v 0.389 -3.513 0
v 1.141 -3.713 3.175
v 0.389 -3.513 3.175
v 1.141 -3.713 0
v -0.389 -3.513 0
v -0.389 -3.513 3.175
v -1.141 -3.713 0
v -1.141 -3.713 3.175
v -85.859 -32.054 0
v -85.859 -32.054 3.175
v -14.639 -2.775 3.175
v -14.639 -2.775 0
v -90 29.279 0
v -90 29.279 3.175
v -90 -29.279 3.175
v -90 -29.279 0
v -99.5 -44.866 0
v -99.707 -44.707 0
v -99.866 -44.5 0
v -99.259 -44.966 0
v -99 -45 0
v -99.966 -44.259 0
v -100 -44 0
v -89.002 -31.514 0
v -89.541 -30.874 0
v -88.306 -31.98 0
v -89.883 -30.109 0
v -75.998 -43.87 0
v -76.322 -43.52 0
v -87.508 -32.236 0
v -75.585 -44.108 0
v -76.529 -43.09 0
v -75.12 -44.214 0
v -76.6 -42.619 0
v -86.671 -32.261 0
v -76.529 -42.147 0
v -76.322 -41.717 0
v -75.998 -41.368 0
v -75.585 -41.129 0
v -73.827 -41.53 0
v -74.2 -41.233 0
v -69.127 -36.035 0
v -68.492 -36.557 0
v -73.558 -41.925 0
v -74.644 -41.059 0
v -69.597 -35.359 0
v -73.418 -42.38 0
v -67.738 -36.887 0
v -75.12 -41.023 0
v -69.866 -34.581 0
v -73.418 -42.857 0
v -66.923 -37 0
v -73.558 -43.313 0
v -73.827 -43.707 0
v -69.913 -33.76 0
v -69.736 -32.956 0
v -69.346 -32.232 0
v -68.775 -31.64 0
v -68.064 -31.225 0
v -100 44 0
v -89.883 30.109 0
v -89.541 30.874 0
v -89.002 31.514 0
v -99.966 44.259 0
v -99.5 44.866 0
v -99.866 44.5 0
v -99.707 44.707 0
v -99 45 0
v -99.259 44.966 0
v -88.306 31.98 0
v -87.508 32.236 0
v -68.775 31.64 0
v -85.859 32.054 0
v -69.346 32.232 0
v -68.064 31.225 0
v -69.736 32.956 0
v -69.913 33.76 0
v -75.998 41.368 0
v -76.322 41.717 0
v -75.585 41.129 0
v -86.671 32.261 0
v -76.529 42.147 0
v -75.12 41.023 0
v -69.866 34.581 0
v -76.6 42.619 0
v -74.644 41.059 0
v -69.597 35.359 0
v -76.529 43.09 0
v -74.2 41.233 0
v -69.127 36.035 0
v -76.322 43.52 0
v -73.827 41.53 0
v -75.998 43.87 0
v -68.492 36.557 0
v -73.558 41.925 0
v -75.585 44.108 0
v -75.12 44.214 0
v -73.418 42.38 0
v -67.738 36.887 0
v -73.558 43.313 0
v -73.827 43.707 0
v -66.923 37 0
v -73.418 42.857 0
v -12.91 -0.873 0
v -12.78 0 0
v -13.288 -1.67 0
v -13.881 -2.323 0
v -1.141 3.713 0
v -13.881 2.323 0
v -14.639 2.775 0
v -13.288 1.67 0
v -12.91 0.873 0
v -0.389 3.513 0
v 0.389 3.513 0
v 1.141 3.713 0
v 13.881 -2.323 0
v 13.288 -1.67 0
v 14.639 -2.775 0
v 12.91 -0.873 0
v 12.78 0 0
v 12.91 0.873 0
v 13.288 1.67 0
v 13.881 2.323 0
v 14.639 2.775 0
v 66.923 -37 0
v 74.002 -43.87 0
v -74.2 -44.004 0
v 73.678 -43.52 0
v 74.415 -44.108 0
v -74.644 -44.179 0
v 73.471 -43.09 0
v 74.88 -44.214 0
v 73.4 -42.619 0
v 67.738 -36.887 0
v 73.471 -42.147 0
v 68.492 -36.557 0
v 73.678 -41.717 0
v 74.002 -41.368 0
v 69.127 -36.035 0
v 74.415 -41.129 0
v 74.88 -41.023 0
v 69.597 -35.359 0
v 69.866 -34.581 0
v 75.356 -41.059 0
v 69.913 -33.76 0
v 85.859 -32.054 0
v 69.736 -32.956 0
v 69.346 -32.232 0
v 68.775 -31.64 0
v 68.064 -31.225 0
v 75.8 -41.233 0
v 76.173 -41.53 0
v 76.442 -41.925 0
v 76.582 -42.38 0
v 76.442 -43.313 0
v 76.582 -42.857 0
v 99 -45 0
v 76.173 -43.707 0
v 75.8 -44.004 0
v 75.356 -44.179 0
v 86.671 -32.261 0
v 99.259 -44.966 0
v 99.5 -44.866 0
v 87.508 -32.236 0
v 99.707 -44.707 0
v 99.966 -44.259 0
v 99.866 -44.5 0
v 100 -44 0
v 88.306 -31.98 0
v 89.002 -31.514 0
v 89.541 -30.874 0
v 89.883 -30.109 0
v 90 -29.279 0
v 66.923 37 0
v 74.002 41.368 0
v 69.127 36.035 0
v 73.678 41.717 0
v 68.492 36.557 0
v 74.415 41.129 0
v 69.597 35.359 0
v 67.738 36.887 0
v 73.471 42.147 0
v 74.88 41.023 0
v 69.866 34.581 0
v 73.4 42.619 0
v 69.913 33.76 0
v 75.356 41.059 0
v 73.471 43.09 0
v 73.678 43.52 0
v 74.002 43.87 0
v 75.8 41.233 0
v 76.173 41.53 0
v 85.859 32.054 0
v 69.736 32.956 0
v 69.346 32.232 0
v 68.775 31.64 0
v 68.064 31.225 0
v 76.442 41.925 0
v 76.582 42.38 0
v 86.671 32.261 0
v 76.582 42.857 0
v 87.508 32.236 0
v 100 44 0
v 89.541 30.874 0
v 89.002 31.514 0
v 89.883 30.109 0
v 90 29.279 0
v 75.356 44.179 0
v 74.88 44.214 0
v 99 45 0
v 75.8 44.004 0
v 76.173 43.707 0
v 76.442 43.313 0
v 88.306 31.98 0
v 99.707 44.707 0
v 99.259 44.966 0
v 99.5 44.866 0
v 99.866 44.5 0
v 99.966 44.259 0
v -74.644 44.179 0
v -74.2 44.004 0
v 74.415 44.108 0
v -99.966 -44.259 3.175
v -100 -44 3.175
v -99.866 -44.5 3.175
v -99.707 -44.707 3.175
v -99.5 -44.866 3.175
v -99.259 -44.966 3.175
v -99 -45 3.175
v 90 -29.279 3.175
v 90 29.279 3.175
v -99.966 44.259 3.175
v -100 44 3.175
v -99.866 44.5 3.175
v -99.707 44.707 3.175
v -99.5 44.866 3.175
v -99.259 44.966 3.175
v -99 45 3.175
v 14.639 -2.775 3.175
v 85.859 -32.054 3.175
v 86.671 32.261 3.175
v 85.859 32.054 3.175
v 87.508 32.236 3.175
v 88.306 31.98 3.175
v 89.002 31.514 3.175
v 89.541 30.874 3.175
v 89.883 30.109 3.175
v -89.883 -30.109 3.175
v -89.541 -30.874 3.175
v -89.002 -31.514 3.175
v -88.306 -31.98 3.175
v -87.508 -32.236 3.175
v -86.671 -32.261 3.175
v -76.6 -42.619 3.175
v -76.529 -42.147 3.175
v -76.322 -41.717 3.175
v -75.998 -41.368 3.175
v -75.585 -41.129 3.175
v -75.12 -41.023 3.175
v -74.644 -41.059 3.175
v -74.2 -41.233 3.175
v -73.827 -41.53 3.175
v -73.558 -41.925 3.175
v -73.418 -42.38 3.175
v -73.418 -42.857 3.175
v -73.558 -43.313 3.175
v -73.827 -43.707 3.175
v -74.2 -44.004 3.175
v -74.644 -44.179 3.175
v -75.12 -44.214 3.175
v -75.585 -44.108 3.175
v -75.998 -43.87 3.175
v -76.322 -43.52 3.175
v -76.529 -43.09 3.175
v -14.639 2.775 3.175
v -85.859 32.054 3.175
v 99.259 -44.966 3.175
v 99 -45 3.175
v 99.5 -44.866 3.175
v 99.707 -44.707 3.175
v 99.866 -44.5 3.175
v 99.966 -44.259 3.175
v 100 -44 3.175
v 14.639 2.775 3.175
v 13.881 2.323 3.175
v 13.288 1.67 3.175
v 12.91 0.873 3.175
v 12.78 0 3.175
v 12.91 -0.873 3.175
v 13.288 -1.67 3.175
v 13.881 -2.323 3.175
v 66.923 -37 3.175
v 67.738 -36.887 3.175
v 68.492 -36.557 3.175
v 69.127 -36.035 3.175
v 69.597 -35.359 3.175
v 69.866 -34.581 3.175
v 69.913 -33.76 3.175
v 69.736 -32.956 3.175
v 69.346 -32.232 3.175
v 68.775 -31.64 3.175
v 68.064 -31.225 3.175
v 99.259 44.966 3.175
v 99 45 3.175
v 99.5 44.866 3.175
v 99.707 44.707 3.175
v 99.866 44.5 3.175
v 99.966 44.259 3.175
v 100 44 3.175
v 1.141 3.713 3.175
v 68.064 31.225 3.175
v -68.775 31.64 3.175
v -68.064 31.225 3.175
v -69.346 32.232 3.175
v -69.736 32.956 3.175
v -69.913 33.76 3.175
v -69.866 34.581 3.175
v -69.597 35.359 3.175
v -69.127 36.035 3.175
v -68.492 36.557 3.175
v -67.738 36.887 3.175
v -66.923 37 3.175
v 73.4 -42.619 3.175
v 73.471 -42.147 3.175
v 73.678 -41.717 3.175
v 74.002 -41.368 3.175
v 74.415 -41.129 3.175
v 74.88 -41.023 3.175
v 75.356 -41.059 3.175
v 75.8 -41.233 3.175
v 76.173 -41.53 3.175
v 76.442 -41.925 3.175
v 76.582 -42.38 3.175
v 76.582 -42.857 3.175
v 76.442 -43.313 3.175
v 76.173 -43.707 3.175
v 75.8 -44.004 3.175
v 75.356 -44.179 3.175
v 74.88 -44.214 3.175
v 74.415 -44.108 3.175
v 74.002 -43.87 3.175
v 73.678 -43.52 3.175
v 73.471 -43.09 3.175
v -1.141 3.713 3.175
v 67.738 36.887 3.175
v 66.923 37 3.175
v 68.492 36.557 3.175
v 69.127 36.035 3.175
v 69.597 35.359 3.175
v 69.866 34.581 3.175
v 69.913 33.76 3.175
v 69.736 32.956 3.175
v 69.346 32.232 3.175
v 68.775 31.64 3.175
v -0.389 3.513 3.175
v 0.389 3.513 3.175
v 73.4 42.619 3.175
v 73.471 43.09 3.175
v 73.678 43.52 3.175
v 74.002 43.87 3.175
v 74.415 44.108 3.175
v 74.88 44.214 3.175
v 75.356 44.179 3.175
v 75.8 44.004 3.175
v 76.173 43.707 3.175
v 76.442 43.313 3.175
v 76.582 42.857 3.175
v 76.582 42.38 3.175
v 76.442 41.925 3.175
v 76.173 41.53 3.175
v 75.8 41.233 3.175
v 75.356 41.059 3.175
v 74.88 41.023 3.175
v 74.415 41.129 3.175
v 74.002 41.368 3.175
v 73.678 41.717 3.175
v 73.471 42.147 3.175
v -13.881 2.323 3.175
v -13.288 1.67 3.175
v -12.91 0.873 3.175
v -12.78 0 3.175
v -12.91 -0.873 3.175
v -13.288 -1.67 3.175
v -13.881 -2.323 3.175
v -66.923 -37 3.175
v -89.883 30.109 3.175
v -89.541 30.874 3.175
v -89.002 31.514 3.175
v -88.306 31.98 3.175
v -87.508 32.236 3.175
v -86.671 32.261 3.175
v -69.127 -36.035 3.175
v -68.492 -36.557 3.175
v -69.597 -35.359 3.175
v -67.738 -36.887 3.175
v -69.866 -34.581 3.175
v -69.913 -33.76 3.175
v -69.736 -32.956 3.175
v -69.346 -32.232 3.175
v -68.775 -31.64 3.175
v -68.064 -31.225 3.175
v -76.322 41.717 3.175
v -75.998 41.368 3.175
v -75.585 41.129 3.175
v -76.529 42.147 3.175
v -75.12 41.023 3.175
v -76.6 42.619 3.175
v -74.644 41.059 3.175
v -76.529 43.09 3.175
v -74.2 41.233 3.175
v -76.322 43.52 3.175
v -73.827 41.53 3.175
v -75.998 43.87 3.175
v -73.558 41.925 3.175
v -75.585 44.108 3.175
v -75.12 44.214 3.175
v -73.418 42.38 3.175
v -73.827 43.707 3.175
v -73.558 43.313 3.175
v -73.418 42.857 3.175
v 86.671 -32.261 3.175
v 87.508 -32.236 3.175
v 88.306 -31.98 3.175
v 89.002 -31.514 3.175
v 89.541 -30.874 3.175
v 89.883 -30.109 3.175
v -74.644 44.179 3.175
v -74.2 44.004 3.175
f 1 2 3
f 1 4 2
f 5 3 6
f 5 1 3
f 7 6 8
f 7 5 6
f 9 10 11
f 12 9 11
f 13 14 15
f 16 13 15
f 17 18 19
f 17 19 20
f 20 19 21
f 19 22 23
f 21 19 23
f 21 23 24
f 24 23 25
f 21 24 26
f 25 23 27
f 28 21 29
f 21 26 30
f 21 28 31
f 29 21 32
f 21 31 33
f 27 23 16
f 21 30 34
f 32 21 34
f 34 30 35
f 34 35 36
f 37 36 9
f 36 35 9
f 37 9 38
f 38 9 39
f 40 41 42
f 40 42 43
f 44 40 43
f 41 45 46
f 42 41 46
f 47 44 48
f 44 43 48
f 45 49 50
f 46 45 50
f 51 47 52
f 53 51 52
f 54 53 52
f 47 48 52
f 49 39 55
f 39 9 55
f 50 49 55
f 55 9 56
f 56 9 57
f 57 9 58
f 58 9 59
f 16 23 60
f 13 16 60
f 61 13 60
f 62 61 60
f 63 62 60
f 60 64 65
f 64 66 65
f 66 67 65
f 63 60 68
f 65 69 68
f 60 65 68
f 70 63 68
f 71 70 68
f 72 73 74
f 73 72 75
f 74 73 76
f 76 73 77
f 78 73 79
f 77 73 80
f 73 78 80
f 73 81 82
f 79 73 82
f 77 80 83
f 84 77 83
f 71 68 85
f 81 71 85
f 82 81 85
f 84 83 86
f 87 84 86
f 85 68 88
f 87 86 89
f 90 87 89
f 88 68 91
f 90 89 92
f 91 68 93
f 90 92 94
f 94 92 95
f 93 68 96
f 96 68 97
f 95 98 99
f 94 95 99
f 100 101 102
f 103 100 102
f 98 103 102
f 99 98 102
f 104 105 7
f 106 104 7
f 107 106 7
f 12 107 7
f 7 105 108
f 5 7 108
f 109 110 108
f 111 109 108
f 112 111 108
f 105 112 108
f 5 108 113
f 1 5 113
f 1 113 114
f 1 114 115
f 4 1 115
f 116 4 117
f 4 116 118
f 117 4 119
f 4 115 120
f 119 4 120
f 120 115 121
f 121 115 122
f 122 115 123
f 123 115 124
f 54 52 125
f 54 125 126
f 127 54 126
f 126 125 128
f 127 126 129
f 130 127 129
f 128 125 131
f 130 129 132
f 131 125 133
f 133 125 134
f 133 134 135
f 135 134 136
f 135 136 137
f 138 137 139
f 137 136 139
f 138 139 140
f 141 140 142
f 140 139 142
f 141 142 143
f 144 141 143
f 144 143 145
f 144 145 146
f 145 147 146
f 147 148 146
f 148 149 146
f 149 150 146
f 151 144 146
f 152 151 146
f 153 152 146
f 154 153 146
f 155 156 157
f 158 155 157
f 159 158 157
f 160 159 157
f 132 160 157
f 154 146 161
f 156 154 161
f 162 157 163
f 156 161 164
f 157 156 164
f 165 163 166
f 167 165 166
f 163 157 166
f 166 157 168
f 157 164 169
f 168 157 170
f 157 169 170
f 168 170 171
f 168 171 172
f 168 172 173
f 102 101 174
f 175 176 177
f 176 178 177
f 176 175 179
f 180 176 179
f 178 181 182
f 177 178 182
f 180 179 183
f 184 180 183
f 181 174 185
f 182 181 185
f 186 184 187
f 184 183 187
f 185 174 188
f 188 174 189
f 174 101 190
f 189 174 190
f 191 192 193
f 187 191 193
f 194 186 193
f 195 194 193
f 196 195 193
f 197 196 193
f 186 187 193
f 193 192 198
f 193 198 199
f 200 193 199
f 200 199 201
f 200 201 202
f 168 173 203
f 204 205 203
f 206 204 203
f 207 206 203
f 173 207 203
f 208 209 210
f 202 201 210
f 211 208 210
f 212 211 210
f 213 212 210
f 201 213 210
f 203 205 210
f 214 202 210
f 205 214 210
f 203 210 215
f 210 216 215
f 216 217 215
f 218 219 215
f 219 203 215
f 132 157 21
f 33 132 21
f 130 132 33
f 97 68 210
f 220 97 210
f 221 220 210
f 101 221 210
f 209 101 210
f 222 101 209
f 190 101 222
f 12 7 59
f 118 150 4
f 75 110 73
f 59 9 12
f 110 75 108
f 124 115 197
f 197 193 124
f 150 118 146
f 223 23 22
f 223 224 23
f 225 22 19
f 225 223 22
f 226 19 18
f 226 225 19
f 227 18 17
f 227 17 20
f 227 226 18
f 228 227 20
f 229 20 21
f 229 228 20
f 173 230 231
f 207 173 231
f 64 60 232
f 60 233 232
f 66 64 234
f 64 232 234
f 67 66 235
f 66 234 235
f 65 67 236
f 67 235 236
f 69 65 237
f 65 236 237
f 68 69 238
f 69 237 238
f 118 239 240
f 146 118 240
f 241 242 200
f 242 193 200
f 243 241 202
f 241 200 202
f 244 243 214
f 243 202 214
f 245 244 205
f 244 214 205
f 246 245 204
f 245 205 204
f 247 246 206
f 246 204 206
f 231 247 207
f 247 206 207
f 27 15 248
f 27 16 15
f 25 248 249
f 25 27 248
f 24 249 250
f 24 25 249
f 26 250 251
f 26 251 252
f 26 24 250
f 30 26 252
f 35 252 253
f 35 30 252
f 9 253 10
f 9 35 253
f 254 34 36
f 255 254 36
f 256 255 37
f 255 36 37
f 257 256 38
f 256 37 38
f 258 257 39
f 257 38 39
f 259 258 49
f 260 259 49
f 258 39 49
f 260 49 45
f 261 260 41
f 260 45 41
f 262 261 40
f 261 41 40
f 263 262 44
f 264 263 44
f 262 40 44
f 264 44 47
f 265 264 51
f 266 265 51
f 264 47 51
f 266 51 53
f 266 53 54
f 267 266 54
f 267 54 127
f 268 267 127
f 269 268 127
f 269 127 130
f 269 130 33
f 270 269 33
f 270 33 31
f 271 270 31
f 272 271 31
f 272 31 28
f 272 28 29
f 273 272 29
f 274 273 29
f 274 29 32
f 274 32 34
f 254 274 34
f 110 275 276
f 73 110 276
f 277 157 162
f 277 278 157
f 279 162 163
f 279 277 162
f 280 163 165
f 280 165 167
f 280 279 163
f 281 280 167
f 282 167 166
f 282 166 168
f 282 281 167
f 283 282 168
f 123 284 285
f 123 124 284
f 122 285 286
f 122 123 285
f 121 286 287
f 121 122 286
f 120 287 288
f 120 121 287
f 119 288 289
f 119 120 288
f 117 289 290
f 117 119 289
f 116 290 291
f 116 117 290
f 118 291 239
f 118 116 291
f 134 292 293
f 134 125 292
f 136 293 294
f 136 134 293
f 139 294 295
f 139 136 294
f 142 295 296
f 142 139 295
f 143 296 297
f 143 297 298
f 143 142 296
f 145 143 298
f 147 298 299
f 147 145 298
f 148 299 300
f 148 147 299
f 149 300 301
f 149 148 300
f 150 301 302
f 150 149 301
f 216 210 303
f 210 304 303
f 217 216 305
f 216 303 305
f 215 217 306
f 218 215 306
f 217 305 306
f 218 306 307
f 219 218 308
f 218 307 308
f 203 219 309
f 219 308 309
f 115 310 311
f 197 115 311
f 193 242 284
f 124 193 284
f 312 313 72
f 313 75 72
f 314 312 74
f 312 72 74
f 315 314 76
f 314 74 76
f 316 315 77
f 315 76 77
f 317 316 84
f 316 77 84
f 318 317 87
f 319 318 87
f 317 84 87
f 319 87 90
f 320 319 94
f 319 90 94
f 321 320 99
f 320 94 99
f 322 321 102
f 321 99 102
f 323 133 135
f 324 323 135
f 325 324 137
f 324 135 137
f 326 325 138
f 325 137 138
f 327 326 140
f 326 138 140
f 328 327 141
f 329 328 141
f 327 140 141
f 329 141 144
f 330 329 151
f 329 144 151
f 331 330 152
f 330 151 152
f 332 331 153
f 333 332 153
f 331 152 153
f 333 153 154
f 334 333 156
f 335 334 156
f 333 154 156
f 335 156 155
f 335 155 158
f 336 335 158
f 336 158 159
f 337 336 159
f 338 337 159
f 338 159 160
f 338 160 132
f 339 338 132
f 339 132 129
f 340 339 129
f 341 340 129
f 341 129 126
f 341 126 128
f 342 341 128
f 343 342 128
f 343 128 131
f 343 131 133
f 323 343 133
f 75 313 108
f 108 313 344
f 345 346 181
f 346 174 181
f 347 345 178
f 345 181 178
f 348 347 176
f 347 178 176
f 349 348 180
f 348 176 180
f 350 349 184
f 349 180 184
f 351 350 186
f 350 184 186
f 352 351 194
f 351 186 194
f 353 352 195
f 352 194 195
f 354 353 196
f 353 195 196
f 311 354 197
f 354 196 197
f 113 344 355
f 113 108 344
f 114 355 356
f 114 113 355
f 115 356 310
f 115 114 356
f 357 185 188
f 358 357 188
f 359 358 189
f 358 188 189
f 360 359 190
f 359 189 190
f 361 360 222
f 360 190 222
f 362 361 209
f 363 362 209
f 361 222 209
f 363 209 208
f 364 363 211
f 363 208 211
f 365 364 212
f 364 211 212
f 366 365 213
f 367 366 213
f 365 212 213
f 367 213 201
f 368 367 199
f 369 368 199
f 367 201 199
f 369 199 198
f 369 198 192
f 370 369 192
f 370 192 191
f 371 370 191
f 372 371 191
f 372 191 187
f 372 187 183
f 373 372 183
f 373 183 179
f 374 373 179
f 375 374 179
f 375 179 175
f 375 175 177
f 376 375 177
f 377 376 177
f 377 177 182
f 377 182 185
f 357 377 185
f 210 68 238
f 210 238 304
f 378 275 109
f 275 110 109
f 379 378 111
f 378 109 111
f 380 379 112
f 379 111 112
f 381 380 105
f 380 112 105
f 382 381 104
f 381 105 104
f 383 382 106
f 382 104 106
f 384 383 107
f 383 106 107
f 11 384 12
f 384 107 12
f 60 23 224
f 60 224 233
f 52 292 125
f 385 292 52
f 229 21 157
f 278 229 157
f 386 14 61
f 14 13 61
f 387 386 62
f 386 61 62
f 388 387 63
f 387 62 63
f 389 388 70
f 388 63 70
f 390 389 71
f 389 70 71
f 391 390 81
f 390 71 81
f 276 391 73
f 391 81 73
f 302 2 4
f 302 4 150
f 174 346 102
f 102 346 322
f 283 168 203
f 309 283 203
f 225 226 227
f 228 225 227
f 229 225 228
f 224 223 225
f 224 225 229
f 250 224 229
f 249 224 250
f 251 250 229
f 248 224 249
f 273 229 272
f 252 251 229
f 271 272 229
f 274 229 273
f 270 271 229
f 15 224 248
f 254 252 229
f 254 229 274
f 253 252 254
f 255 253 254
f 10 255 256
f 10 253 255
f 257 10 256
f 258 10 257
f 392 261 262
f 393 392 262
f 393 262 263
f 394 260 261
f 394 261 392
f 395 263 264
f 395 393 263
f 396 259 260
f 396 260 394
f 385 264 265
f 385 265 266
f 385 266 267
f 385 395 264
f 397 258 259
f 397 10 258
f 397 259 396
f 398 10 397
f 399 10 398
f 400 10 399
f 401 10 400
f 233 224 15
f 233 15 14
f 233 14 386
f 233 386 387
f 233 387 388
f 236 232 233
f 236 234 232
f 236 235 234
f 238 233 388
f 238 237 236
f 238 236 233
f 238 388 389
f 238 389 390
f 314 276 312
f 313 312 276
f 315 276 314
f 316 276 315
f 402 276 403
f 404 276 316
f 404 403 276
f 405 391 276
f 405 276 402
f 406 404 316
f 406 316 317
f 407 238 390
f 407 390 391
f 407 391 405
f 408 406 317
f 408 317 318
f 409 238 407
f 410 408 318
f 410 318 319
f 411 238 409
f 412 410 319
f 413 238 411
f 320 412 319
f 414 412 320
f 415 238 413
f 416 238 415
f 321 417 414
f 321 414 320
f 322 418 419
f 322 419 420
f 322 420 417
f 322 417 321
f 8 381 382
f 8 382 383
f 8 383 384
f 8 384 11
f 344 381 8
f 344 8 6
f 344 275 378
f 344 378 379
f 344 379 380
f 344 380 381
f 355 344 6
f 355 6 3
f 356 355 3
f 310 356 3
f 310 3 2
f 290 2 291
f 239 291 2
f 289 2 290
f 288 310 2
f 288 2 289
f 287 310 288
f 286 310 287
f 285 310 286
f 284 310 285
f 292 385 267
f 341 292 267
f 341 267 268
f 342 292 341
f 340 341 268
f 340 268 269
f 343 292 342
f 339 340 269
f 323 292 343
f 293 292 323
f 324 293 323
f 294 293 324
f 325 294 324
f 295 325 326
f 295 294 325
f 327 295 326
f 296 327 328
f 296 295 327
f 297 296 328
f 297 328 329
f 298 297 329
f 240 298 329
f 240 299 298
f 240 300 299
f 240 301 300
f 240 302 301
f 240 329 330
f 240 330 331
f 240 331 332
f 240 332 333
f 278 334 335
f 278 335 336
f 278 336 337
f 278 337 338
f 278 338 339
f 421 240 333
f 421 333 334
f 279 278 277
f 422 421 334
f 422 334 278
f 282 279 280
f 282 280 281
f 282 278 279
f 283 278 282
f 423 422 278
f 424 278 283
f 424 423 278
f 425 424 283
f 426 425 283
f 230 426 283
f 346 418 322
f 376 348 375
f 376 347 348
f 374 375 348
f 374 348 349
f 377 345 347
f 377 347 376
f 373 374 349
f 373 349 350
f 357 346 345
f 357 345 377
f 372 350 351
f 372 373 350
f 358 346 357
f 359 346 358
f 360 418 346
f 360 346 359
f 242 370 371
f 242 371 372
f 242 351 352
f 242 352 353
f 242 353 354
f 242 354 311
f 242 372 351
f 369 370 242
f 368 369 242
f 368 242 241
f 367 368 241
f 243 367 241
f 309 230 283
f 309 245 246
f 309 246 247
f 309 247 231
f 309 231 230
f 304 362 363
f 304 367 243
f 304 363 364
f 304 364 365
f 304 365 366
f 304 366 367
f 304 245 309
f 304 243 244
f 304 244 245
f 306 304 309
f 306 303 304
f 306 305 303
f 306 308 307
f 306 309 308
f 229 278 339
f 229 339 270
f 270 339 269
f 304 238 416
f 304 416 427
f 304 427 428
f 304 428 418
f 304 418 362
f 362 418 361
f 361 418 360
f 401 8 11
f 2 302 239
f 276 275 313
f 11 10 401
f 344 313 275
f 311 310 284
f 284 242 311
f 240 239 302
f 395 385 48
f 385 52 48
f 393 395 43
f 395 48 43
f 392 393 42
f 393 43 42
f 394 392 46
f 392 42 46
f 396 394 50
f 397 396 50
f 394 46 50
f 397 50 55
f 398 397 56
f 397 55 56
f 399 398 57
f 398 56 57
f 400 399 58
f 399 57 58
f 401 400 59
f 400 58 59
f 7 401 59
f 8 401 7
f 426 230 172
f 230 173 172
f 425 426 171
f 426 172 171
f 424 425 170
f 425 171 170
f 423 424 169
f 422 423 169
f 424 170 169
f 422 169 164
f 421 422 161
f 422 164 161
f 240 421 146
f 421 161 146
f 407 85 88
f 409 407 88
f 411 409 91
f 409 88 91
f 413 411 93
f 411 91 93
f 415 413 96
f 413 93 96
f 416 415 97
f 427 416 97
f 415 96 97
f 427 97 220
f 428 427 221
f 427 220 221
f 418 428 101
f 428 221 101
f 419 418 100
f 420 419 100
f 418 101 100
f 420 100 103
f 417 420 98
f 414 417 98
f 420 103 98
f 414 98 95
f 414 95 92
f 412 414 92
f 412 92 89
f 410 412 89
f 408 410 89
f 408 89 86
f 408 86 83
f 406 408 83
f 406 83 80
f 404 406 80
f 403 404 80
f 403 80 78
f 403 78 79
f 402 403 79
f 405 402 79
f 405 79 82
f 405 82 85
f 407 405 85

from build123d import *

# Parameters (mm, degrees)
SKETCH1_W            = 200
SKETCH1_H            = 90
BOSS_EXTRUDE1_DEPTH  = 3.175
CUT_EXTRUDE1_DEPTH   = 110.704515062
M3_CLEARANCE_HOLE1_D = 3.2
FILLET1_R            = 3
FILLET2_R            = 1


with BuildPart() as part:
    # Sketch1 → Boss-Extrude1 (new body)
    with BuildSketch(Plane.XY):
        Rectangle(SKETCH1_W, SKETCH1_H)
    extrude(amount=BOSS_EXTRUDE1_DEPTH)

    # Sketch2 → Cut-Extrude1 (cut, through all)
    with BuildSketch(Plane.XY.offset(3.175)):
        Polygon((-90, 33.756373771), (-90, -33.756373771), (-7.889901637, 0), align=None)
        Polygon((-82.110098363, 37), (0, 3.243626229), (82.110098363, 37), align=None)
        Polygon((90, 33.756373771), (7.889901637, 0), (90, -33.756373771), align=None)
        Polygon((-82.110098363, -37), (0, -3.243626229), (82.110098363, -37), align=None)
    extrude(amount=-CUT_EXTRUDE1_DEPTH, mode=Mode.SUBTRACT)

    # M3 Clearance Hole1 (through all)
    with Locations(Plane.XY.offset(3.175)):
        with Locations((-75, 42.61875), (75, 42.61875), (75, -42.61875), (-75, -42.61875)):
            Hole(M3_CLEARANCE_HOLE1_D / 2)

    # Fillet1
    fillet1_edges = [part.edges().sort_by_distance(p)[0] for p in [
        (-82.110098363, 37, 1.5875),
        (82.110098363, 37, 1.5875),
        (0, 3.243626229, 1.5875),
        (82.110098363, -37, 1.5875),
        (-82.110098363, -37, 1.5875),
        (0, -3.243626229, 1.5875),
        (90, 33.756373771, 1.5875),
        (90, -33.756373771, 1.5875),
        (7.889901637, 0, 1.5875),
        (-90, 33.756373771, 1.5875),
        (-7.889901637, 0, 1.5875),
        (-90, -33.756373771, 1.5875),
    ]]
    fillet(fillet1_edges, radius=FILLET1_R)

    # Fillet2
    fillet2_edges = [part.edges().sort_by_distance(p)[0] for p in [
        (100, -45, 1.5875),
        (-100, -45, 1.5875),
        (-100, 45, 1.5875),
        (100, 45, 1.5875),
    ]]
    fillet(fillet2_edges, radius=FILLET2_R)


solid = part.part
